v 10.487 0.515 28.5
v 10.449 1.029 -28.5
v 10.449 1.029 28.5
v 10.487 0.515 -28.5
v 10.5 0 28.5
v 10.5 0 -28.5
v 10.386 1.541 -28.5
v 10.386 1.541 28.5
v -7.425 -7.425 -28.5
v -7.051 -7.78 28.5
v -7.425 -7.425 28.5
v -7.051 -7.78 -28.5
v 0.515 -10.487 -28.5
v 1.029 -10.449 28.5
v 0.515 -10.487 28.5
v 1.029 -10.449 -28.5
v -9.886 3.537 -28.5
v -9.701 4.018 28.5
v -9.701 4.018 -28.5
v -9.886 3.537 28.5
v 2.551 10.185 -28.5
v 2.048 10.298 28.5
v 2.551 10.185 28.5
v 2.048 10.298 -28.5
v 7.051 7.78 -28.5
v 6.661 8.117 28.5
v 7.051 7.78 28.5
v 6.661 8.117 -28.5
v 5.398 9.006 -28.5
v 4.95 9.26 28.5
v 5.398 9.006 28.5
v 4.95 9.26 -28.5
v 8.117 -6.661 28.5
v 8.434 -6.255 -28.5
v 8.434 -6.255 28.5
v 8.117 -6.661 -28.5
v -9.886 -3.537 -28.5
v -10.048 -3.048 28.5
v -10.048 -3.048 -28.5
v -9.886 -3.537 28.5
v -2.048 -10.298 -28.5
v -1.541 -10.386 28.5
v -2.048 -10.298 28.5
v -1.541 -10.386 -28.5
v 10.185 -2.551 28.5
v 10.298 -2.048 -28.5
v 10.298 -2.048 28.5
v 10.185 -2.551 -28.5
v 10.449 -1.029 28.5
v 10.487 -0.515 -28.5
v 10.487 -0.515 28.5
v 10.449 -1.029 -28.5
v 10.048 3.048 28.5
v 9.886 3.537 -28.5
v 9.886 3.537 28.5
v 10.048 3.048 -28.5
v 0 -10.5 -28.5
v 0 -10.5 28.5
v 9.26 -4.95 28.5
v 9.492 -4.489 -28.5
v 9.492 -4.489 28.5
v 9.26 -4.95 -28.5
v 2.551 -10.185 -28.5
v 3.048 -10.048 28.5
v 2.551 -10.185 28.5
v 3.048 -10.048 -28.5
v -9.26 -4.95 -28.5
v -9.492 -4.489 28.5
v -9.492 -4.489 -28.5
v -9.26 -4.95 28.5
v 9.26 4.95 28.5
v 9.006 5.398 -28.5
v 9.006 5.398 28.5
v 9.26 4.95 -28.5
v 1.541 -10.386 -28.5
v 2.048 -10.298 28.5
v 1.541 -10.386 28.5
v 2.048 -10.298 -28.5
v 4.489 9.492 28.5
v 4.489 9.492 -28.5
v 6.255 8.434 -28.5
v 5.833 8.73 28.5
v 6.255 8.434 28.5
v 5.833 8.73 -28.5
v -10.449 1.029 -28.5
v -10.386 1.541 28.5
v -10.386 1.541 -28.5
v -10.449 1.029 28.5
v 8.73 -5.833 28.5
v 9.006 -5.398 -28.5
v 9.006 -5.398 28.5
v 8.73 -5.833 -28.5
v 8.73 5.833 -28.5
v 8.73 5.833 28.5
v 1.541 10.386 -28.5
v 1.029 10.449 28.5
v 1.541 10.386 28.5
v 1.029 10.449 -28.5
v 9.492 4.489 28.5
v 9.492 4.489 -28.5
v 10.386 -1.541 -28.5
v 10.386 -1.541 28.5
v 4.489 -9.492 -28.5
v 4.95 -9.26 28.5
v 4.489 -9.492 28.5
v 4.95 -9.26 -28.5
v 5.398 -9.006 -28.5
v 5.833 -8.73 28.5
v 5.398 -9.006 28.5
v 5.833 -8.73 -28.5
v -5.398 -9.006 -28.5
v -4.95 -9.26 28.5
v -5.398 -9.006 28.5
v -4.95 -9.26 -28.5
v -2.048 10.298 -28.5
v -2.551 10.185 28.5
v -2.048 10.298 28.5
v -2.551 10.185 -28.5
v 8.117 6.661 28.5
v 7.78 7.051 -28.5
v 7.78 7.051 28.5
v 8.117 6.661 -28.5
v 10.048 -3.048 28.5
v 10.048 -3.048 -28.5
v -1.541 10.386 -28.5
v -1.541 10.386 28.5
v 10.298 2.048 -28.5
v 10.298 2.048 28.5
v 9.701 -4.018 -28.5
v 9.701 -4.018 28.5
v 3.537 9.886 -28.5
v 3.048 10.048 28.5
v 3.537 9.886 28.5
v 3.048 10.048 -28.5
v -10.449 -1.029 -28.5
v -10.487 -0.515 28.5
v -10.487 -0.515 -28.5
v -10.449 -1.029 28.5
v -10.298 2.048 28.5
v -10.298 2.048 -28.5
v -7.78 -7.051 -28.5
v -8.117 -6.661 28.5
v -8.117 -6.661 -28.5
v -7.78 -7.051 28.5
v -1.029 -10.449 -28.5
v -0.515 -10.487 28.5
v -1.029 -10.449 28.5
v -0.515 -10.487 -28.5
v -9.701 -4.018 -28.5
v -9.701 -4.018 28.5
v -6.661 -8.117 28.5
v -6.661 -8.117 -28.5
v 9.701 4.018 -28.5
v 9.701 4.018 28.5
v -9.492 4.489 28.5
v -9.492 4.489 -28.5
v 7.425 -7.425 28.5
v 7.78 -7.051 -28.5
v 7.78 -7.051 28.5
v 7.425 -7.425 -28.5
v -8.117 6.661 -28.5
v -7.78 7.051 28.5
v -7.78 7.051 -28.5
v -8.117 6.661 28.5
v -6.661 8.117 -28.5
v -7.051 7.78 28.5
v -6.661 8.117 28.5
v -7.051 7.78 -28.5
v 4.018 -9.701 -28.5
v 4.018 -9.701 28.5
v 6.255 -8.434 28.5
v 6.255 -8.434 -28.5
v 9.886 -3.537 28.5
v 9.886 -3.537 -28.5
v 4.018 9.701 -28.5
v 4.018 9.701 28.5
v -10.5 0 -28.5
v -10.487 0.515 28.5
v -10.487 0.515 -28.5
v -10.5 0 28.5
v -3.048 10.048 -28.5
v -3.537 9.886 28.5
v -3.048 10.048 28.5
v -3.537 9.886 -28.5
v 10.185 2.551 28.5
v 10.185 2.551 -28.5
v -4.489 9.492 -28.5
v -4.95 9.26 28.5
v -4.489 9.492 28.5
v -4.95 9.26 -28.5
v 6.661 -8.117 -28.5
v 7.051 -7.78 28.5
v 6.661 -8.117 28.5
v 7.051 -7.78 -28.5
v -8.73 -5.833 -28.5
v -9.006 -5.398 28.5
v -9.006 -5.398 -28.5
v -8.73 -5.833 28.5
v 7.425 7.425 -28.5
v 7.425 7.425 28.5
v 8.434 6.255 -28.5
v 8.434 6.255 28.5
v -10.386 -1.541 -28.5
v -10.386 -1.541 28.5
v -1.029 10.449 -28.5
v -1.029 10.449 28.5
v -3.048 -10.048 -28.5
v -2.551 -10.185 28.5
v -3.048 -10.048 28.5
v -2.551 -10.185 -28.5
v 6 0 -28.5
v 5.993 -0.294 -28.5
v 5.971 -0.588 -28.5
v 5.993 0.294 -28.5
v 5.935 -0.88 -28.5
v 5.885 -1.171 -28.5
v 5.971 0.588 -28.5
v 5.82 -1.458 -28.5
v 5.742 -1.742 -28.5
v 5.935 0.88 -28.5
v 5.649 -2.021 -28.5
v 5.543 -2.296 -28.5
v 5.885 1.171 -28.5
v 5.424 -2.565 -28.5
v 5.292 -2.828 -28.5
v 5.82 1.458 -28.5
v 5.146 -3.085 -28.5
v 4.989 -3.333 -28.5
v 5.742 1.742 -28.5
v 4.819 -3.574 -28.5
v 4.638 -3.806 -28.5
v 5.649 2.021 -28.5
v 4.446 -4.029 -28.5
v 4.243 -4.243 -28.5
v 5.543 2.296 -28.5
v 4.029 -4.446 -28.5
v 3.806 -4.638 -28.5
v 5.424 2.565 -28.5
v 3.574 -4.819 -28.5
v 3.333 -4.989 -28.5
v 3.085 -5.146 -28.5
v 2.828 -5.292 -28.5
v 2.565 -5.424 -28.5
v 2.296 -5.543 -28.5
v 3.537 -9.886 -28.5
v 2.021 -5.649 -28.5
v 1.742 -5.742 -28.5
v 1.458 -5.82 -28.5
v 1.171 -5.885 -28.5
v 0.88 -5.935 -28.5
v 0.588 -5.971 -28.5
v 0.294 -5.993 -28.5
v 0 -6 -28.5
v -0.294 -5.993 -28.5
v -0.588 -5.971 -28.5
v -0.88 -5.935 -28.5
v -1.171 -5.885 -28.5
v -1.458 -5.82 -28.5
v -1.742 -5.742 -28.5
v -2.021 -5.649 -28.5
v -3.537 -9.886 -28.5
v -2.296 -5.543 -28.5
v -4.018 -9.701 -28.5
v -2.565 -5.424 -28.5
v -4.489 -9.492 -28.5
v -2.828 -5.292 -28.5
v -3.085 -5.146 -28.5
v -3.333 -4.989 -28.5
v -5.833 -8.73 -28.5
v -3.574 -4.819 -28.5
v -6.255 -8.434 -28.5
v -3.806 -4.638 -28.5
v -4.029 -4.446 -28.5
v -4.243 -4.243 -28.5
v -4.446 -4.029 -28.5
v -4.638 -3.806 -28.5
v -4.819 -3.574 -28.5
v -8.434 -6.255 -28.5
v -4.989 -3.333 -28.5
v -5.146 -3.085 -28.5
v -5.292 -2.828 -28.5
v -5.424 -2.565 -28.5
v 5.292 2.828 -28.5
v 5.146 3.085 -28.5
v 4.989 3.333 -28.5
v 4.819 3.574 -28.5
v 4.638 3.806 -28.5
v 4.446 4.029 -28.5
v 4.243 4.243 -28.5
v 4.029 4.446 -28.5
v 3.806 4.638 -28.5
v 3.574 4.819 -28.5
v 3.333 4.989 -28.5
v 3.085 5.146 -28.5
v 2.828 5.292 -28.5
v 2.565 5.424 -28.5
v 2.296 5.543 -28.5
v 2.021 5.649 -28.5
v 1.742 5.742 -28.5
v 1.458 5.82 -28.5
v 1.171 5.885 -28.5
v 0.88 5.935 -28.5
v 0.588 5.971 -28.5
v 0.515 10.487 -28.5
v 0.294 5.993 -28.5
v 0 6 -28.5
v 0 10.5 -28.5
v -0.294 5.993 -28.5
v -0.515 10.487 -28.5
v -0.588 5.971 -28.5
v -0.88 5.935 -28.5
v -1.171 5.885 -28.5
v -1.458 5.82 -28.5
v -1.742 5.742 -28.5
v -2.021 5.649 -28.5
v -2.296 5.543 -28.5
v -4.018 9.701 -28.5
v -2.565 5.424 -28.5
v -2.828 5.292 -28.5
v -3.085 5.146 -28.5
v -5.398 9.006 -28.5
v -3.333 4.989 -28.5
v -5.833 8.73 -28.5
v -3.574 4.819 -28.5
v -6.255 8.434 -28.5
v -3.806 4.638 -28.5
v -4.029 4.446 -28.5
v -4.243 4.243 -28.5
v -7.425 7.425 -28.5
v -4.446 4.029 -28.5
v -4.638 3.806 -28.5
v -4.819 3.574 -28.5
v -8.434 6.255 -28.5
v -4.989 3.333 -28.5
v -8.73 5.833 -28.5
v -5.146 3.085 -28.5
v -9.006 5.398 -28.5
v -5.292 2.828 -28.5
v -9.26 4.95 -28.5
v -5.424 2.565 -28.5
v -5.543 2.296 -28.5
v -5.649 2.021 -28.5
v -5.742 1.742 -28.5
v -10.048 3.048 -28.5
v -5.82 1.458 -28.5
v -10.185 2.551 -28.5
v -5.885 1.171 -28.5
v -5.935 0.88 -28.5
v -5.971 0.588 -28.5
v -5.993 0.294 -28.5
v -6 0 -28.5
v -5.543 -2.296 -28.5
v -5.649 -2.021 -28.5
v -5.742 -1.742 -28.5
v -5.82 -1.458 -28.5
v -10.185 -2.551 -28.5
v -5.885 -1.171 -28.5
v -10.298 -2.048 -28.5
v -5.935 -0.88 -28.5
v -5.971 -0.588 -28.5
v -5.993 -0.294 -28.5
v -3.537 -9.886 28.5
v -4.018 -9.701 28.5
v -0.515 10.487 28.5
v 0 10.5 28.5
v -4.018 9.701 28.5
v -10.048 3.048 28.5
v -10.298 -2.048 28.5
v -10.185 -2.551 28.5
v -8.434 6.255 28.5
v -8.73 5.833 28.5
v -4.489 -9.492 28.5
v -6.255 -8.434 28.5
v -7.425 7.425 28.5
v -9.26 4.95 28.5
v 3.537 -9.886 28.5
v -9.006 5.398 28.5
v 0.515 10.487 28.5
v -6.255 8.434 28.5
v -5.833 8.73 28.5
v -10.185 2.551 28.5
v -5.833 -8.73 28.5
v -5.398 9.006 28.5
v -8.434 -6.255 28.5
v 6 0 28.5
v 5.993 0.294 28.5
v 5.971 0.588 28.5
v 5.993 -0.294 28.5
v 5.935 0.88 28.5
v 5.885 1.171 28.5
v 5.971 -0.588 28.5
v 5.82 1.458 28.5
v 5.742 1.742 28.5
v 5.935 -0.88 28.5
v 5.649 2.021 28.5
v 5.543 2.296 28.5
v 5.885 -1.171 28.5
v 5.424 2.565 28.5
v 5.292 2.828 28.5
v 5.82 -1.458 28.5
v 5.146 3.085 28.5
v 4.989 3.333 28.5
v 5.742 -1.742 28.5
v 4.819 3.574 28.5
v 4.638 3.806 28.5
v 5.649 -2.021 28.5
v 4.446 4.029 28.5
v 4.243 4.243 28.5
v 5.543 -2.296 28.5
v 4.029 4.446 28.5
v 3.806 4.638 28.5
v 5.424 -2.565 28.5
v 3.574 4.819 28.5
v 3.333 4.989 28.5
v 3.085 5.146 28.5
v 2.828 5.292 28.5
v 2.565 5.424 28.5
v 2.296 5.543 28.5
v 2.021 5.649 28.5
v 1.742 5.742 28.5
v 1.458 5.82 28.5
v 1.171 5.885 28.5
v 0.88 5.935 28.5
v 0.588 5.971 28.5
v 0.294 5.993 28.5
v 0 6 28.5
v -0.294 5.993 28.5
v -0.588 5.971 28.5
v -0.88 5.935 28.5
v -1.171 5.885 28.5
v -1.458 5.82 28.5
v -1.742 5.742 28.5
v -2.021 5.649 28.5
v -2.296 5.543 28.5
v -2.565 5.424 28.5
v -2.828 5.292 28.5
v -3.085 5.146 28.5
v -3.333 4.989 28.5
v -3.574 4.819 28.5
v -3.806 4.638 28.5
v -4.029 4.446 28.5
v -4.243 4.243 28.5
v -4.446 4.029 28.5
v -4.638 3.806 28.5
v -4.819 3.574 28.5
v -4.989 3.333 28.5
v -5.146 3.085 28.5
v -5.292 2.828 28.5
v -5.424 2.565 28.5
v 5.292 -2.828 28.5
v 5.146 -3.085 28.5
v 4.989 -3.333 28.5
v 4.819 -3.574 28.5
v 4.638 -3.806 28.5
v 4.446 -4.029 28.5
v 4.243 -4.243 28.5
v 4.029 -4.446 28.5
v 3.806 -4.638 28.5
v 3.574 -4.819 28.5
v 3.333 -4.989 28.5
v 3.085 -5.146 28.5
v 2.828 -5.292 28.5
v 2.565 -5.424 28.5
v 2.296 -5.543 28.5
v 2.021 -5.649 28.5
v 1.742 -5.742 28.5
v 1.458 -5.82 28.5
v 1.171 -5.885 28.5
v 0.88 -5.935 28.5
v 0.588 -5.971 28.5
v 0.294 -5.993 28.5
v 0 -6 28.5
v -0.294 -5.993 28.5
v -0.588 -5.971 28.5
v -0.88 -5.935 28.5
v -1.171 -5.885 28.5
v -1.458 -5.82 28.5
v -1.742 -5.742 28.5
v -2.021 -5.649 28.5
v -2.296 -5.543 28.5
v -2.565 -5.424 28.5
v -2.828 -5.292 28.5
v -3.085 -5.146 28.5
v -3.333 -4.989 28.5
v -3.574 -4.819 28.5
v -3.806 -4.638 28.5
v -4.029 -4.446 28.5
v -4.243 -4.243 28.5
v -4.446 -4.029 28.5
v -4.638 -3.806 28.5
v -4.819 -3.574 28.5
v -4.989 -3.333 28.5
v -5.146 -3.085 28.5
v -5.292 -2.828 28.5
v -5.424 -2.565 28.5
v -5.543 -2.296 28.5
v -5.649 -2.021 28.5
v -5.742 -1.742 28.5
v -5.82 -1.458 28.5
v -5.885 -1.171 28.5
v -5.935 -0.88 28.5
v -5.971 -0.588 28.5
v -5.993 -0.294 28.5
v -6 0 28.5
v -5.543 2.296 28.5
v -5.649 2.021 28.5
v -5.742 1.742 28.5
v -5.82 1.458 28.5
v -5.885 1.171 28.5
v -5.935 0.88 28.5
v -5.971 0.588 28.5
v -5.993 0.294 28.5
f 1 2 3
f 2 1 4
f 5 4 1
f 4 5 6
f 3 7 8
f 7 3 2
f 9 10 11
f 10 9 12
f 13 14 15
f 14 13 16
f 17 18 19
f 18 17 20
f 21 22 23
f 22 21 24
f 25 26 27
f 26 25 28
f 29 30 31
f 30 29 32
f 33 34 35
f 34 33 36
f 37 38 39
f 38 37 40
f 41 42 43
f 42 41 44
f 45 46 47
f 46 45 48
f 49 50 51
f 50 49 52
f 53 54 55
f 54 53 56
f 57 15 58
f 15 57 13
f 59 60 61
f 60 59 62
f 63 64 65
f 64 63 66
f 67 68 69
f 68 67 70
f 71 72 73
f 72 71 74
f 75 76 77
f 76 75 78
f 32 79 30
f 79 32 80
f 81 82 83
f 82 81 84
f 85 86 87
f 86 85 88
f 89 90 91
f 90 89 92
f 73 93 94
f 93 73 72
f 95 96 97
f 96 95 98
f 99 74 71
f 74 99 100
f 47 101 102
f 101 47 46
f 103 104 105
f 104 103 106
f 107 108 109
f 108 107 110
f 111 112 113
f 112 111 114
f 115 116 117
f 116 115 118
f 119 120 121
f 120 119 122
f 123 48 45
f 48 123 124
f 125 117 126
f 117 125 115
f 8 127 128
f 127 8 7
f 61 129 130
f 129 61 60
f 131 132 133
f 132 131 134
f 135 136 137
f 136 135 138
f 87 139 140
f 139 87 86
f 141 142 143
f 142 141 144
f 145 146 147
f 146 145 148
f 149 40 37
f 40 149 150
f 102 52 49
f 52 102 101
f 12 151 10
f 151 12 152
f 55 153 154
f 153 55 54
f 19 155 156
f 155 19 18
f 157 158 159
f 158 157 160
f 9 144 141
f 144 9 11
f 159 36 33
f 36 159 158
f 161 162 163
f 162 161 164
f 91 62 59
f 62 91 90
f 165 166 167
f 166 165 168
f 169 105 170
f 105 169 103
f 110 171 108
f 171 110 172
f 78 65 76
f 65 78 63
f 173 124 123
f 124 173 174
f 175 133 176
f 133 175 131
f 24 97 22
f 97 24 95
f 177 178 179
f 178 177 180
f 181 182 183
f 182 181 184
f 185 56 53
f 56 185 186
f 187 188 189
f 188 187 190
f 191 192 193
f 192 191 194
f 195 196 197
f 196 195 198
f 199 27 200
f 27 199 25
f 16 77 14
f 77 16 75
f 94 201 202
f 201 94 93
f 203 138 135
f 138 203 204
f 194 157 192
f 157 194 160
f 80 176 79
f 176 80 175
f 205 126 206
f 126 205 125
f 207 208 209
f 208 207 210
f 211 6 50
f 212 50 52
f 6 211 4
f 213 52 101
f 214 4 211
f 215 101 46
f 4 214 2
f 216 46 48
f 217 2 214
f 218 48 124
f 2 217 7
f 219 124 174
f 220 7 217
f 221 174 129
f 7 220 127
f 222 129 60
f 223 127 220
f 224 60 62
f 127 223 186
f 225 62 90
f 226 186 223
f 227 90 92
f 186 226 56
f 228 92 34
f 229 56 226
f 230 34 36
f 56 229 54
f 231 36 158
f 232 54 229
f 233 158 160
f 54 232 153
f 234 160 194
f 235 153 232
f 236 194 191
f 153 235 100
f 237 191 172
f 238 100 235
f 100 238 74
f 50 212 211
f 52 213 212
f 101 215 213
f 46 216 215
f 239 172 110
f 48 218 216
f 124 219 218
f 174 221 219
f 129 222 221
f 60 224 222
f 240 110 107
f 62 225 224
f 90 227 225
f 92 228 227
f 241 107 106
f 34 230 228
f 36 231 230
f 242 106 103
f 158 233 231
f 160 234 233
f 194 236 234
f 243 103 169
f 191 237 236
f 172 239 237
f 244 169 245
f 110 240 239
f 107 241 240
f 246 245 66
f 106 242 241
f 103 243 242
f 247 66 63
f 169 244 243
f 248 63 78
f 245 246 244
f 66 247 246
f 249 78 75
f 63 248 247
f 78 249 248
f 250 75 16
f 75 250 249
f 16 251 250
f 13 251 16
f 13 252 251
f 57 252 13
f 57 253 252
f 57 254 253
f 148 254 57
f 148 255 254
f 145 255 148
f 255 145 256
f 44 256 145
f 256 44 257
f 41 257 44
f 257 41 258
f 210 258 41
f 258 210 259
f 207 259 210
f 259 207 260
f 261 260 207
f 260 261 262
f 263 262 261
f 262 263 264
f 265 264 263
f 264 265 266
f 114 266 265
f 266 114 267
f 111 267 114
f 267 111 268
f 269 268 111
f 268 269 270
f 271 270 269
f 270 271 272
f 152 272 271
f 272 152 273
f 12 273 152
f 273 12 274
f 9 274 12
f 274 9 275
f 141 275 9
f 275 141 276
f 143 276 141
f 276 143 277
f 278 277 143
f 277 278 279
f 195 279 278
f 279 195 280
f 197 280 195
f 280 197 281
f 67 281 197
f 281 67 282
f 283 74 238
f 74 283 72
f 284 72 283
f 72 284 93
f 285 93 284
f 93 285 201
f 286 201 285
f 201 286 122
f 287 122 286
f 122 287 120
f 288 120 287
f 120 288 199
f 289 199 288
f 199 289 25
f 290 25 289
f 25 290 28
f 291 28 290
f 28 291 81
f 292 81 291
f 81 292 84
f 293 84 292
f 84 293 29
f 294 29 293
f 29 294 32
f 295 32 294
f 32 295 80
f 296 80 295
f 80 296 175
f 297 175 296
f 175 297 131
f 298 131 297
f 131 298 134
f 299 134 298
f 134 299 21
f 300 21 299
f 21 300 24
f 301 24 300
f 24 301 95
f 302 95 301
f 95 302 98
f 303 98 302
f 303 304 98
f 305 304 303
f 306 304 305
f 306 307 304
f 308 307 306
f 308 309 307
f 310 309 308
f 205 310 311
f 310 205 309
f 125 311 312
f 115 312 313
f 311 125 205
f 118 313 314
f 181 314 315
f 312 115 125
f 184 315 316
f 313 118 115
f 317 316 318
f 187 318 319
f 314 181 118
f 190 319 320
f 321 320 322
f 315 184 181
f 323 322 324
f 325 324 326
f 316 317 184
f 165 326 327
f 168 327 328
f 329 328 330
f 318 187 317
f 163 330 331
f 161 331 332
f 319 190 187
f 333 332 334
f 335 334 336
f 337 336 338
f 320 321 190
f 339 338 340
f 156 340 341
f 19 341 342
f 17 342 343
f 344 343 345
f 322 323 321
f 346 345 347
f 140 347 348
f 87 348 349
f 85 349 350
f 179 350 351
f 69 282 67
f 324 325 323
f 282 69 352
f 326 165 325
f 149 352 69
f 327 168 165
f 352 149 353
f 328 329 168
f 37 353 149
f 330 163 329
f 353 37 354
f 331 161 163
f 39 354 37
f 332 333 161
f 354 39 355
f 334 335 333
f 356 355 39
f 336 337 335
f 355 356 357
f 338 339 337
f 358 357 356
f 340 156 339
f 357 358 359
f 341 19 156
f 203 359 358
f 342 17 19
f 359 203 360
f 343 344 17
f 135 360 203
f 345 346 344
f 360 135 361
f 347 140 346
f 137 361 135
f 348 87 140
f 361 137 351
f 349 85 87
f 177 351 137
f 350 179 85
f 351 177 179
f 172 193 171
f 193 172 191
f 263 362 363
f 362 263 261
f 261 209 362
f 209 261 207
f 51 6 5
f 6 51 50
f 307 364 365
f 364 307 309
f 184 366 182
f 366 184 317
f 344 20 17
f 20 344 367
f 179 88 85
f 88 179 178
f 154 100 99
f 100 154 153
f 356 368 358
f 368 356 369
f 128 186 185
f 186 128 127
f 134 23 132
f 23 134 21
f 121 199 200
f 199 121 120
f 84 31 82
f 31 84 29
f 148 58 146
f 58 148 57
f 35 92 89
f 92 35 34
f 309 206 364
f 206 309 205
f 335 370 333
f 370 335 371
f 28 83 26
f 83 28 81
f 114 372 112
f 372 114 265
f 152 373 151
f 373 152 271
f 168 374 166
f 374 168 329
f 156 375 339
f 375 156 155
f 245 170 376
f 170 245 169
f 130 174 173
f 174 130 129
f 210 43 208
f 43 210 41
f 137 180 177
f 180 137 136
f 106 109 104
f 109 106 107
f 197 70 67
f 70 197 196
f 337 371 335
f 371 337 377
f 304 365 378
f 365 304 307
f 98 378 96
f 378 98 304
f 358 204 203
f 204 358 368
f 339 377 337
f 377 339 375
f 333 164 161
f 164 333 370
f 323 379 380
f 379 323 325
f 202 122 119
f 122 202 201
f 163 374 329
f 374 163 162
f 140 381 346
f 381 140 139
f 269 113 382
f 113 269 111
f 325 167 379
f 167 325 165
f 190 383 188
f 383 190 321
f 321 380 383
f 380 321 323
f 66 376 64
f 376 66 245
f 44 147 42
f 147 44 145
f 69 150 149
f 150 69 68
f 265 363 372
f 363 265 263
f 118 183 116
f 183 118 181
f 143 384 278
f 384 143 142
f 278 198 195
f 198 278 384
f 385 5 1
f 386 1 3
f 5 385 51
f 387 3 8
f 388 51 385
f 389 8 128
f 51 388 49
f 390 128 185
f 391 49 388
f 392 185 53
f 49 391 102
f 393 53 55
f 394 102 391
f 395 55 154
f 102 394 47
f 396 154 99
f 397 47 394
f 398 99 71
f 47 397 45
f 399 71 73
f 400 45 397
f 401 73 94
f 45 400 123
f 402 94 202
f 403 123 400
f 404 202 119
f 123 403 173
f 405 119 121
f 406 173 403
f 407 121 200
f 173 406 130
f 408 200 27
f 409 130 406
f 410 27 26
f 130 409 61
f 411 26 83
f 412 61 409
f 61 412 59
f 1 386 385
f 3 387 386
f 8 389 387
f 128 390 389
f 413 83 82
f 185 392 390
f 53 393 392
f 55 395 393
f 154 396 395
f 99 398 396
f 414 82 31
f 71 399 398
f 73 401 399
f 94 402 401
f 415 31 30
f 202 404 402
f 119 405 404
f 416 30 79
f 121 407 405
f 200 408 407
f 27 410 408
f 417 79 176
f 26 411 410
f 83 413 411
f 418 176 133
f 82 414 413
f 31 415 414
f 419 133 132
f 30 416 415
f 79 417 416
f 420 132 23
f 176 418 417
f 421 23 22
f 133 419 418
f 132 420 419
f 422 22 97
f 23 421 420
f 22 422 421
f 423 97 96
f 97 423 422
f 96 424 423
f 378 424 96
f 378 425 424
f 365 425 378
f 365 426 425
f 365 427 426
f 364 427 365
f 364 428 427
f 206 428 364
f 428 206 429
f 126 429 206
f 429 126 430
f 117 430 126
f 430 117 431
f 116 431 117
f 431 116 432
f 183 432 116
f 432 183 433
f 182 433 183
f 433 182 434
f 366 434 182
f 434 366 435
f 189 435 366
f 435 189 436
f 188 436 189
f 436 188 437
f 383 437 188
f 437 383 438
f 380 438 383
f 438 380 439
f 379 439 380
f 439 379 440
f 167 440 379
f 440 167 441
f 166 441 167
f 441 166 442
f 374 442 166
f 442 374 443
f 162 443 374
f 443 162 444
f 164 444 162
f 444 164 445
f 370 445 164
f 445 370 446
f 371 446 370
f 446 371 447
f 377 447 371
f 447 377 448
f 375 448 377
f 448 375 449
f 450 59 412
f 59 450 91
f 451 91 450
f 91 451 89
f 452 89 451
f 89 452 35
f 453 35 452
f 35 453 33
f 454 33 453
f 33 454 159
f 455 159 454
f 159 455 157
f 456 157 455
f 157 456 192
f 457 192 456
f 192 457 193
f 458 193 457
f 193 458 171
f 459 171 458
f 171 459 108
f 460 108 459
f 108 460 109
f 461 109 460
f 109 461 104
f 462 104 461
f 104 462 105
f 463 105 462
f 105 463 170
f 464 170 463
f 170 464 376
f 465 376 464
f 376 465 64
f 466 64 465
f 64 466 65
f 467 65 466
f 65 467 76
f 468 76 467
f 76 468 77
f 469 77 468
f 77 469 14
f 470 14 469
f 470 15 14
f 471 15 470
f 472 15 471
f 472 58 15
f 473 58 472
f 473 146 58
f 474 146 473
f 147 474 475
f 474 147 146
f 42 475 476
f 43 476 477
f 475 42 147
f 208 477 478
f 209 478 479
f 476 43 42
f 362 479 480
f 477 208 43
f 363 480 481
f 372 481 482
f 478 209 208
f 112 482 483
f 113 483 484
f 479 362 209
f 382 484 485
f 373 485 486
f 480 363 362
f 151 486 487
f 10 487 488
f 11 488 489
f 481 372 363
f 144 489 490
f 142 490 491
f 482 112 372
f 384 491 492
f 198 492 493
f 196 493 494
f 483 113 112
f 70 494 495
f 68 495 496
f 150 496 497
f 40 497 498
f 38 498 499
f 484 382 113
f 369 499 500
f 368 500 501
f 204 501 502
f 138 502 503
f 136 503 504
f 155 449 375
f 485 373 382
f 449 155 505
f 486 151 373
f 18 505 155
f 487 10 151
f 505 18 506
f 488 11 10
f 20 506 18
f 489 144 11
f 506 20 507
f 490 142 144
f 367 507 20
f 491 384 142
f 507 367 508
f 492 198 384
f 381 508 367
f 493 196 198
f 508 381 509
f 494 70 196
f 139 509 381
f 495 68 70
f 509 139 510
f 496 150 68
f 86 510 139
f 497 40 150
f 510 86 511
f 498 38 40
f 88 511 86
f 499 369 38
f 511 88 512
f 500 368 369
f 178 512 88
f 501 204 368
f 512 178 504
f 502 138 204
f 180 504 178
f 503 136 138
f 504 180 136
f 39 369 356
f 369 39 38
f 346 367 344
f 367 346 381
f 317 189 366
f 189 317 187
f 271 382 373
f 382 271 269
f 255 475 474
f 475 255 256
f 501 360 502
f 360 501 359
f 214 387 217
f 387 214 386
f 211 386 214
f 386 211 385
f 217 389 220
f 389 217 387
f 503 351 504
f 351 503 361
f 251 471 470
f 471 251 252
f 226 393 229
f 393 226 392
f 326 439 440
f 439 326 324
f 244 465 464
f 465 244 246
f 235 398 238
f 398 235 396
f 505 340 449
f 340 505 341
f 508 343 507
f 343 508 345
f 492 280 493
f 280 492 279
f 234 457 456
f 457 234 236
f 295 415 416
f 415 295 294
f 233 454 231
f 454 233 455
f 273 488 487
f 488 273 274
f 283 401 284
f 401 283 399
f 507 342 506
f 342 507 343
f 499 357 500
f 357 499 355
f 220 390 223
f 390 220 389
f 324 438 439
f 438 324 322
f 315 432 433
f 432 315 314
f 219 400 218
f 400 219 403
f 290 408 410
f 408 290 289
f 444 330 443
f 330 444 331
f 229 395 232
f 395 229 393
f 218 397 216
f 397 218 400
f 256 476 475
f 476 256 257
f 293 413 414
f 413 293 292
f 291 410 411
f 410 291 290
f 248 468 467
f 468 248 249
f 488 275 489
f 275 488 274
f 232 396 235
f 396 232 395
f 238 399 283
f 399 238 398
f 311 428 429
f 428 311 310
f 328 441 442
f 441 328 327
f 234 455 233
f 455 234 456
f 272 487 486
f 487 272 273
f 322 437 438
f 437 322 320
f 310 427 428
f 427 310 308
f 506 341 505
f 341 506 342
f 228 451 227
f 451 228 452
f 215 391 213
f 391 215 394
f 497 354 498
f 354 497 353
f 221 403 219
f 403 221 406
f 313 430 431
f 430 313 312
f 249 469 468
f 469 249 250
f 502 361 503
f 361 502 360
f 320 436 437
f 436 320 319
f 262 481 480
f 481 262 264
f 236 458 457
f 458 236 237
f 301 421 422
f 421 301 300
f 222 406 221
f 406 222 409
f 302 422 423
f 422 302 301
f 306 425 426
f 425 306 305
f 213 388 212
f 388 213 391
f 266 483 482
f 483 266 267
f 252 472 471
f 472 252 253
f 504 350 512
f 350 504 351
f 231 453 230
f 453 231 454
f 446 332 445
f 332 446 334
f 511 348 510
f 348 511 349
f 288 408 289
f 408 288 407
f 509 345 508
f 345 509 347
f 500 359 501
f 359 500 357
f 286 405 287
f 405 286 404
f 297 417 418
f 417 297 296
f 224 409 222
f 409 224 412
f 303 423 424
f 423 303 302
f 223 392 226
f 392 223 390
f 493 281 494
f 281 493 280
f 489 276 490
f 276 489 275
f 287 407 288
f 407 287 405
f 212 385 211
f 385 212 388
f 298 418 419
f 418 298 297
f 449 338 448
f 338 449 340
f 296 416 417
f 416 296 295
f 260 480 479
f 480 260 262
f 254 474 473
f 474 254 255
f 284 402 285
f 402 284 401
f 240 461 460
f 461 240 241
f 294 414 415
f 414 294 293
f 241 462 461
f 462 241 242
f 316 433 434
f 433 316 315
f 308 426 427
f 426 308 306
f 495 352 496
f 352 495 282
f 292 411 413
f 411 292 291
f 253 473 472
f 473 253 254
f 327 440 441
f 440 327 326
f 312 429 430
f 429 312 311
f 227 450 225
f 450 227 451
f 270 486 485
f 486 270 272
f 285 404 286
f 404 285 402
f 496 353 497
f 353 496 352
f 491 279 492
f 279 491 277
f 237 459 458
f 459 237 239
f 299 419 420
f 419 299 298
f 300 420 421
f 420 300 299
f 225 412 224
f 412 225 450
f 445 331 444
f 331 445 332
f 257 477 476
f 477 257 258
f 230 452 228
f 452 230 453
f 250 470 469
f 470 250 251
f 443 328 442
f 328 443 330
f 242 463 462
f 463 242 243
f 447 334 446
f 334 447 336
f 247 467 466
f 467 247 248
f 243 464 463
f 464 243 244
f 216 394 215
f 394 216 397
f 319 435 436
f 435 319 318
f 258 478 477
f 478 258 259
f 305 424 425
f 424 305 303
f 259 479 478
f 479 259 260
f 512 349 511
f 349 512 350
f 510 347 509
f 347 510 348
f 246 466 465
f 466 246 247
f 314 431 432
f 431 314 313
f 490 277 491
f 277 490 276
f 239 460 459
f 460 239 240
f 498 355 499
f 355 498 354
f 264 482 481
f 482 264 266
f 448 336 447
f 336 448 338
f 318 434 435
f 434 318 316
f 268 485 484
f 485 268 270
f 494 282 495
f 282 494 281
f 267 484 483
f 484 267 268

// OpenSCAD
$fn=128;

bore_d = 12.0;
od_d = 21.0;
len = 57.0;

module linear_bearing(bore_d, od_d, len) {
    difference() {
        cylinder(d=od_d, h=len, center=true);
        cylinder(d=bore_d, h=len + 0.2, center=true);
    }
}

linear_bearing(bore_d, od_d, len);
